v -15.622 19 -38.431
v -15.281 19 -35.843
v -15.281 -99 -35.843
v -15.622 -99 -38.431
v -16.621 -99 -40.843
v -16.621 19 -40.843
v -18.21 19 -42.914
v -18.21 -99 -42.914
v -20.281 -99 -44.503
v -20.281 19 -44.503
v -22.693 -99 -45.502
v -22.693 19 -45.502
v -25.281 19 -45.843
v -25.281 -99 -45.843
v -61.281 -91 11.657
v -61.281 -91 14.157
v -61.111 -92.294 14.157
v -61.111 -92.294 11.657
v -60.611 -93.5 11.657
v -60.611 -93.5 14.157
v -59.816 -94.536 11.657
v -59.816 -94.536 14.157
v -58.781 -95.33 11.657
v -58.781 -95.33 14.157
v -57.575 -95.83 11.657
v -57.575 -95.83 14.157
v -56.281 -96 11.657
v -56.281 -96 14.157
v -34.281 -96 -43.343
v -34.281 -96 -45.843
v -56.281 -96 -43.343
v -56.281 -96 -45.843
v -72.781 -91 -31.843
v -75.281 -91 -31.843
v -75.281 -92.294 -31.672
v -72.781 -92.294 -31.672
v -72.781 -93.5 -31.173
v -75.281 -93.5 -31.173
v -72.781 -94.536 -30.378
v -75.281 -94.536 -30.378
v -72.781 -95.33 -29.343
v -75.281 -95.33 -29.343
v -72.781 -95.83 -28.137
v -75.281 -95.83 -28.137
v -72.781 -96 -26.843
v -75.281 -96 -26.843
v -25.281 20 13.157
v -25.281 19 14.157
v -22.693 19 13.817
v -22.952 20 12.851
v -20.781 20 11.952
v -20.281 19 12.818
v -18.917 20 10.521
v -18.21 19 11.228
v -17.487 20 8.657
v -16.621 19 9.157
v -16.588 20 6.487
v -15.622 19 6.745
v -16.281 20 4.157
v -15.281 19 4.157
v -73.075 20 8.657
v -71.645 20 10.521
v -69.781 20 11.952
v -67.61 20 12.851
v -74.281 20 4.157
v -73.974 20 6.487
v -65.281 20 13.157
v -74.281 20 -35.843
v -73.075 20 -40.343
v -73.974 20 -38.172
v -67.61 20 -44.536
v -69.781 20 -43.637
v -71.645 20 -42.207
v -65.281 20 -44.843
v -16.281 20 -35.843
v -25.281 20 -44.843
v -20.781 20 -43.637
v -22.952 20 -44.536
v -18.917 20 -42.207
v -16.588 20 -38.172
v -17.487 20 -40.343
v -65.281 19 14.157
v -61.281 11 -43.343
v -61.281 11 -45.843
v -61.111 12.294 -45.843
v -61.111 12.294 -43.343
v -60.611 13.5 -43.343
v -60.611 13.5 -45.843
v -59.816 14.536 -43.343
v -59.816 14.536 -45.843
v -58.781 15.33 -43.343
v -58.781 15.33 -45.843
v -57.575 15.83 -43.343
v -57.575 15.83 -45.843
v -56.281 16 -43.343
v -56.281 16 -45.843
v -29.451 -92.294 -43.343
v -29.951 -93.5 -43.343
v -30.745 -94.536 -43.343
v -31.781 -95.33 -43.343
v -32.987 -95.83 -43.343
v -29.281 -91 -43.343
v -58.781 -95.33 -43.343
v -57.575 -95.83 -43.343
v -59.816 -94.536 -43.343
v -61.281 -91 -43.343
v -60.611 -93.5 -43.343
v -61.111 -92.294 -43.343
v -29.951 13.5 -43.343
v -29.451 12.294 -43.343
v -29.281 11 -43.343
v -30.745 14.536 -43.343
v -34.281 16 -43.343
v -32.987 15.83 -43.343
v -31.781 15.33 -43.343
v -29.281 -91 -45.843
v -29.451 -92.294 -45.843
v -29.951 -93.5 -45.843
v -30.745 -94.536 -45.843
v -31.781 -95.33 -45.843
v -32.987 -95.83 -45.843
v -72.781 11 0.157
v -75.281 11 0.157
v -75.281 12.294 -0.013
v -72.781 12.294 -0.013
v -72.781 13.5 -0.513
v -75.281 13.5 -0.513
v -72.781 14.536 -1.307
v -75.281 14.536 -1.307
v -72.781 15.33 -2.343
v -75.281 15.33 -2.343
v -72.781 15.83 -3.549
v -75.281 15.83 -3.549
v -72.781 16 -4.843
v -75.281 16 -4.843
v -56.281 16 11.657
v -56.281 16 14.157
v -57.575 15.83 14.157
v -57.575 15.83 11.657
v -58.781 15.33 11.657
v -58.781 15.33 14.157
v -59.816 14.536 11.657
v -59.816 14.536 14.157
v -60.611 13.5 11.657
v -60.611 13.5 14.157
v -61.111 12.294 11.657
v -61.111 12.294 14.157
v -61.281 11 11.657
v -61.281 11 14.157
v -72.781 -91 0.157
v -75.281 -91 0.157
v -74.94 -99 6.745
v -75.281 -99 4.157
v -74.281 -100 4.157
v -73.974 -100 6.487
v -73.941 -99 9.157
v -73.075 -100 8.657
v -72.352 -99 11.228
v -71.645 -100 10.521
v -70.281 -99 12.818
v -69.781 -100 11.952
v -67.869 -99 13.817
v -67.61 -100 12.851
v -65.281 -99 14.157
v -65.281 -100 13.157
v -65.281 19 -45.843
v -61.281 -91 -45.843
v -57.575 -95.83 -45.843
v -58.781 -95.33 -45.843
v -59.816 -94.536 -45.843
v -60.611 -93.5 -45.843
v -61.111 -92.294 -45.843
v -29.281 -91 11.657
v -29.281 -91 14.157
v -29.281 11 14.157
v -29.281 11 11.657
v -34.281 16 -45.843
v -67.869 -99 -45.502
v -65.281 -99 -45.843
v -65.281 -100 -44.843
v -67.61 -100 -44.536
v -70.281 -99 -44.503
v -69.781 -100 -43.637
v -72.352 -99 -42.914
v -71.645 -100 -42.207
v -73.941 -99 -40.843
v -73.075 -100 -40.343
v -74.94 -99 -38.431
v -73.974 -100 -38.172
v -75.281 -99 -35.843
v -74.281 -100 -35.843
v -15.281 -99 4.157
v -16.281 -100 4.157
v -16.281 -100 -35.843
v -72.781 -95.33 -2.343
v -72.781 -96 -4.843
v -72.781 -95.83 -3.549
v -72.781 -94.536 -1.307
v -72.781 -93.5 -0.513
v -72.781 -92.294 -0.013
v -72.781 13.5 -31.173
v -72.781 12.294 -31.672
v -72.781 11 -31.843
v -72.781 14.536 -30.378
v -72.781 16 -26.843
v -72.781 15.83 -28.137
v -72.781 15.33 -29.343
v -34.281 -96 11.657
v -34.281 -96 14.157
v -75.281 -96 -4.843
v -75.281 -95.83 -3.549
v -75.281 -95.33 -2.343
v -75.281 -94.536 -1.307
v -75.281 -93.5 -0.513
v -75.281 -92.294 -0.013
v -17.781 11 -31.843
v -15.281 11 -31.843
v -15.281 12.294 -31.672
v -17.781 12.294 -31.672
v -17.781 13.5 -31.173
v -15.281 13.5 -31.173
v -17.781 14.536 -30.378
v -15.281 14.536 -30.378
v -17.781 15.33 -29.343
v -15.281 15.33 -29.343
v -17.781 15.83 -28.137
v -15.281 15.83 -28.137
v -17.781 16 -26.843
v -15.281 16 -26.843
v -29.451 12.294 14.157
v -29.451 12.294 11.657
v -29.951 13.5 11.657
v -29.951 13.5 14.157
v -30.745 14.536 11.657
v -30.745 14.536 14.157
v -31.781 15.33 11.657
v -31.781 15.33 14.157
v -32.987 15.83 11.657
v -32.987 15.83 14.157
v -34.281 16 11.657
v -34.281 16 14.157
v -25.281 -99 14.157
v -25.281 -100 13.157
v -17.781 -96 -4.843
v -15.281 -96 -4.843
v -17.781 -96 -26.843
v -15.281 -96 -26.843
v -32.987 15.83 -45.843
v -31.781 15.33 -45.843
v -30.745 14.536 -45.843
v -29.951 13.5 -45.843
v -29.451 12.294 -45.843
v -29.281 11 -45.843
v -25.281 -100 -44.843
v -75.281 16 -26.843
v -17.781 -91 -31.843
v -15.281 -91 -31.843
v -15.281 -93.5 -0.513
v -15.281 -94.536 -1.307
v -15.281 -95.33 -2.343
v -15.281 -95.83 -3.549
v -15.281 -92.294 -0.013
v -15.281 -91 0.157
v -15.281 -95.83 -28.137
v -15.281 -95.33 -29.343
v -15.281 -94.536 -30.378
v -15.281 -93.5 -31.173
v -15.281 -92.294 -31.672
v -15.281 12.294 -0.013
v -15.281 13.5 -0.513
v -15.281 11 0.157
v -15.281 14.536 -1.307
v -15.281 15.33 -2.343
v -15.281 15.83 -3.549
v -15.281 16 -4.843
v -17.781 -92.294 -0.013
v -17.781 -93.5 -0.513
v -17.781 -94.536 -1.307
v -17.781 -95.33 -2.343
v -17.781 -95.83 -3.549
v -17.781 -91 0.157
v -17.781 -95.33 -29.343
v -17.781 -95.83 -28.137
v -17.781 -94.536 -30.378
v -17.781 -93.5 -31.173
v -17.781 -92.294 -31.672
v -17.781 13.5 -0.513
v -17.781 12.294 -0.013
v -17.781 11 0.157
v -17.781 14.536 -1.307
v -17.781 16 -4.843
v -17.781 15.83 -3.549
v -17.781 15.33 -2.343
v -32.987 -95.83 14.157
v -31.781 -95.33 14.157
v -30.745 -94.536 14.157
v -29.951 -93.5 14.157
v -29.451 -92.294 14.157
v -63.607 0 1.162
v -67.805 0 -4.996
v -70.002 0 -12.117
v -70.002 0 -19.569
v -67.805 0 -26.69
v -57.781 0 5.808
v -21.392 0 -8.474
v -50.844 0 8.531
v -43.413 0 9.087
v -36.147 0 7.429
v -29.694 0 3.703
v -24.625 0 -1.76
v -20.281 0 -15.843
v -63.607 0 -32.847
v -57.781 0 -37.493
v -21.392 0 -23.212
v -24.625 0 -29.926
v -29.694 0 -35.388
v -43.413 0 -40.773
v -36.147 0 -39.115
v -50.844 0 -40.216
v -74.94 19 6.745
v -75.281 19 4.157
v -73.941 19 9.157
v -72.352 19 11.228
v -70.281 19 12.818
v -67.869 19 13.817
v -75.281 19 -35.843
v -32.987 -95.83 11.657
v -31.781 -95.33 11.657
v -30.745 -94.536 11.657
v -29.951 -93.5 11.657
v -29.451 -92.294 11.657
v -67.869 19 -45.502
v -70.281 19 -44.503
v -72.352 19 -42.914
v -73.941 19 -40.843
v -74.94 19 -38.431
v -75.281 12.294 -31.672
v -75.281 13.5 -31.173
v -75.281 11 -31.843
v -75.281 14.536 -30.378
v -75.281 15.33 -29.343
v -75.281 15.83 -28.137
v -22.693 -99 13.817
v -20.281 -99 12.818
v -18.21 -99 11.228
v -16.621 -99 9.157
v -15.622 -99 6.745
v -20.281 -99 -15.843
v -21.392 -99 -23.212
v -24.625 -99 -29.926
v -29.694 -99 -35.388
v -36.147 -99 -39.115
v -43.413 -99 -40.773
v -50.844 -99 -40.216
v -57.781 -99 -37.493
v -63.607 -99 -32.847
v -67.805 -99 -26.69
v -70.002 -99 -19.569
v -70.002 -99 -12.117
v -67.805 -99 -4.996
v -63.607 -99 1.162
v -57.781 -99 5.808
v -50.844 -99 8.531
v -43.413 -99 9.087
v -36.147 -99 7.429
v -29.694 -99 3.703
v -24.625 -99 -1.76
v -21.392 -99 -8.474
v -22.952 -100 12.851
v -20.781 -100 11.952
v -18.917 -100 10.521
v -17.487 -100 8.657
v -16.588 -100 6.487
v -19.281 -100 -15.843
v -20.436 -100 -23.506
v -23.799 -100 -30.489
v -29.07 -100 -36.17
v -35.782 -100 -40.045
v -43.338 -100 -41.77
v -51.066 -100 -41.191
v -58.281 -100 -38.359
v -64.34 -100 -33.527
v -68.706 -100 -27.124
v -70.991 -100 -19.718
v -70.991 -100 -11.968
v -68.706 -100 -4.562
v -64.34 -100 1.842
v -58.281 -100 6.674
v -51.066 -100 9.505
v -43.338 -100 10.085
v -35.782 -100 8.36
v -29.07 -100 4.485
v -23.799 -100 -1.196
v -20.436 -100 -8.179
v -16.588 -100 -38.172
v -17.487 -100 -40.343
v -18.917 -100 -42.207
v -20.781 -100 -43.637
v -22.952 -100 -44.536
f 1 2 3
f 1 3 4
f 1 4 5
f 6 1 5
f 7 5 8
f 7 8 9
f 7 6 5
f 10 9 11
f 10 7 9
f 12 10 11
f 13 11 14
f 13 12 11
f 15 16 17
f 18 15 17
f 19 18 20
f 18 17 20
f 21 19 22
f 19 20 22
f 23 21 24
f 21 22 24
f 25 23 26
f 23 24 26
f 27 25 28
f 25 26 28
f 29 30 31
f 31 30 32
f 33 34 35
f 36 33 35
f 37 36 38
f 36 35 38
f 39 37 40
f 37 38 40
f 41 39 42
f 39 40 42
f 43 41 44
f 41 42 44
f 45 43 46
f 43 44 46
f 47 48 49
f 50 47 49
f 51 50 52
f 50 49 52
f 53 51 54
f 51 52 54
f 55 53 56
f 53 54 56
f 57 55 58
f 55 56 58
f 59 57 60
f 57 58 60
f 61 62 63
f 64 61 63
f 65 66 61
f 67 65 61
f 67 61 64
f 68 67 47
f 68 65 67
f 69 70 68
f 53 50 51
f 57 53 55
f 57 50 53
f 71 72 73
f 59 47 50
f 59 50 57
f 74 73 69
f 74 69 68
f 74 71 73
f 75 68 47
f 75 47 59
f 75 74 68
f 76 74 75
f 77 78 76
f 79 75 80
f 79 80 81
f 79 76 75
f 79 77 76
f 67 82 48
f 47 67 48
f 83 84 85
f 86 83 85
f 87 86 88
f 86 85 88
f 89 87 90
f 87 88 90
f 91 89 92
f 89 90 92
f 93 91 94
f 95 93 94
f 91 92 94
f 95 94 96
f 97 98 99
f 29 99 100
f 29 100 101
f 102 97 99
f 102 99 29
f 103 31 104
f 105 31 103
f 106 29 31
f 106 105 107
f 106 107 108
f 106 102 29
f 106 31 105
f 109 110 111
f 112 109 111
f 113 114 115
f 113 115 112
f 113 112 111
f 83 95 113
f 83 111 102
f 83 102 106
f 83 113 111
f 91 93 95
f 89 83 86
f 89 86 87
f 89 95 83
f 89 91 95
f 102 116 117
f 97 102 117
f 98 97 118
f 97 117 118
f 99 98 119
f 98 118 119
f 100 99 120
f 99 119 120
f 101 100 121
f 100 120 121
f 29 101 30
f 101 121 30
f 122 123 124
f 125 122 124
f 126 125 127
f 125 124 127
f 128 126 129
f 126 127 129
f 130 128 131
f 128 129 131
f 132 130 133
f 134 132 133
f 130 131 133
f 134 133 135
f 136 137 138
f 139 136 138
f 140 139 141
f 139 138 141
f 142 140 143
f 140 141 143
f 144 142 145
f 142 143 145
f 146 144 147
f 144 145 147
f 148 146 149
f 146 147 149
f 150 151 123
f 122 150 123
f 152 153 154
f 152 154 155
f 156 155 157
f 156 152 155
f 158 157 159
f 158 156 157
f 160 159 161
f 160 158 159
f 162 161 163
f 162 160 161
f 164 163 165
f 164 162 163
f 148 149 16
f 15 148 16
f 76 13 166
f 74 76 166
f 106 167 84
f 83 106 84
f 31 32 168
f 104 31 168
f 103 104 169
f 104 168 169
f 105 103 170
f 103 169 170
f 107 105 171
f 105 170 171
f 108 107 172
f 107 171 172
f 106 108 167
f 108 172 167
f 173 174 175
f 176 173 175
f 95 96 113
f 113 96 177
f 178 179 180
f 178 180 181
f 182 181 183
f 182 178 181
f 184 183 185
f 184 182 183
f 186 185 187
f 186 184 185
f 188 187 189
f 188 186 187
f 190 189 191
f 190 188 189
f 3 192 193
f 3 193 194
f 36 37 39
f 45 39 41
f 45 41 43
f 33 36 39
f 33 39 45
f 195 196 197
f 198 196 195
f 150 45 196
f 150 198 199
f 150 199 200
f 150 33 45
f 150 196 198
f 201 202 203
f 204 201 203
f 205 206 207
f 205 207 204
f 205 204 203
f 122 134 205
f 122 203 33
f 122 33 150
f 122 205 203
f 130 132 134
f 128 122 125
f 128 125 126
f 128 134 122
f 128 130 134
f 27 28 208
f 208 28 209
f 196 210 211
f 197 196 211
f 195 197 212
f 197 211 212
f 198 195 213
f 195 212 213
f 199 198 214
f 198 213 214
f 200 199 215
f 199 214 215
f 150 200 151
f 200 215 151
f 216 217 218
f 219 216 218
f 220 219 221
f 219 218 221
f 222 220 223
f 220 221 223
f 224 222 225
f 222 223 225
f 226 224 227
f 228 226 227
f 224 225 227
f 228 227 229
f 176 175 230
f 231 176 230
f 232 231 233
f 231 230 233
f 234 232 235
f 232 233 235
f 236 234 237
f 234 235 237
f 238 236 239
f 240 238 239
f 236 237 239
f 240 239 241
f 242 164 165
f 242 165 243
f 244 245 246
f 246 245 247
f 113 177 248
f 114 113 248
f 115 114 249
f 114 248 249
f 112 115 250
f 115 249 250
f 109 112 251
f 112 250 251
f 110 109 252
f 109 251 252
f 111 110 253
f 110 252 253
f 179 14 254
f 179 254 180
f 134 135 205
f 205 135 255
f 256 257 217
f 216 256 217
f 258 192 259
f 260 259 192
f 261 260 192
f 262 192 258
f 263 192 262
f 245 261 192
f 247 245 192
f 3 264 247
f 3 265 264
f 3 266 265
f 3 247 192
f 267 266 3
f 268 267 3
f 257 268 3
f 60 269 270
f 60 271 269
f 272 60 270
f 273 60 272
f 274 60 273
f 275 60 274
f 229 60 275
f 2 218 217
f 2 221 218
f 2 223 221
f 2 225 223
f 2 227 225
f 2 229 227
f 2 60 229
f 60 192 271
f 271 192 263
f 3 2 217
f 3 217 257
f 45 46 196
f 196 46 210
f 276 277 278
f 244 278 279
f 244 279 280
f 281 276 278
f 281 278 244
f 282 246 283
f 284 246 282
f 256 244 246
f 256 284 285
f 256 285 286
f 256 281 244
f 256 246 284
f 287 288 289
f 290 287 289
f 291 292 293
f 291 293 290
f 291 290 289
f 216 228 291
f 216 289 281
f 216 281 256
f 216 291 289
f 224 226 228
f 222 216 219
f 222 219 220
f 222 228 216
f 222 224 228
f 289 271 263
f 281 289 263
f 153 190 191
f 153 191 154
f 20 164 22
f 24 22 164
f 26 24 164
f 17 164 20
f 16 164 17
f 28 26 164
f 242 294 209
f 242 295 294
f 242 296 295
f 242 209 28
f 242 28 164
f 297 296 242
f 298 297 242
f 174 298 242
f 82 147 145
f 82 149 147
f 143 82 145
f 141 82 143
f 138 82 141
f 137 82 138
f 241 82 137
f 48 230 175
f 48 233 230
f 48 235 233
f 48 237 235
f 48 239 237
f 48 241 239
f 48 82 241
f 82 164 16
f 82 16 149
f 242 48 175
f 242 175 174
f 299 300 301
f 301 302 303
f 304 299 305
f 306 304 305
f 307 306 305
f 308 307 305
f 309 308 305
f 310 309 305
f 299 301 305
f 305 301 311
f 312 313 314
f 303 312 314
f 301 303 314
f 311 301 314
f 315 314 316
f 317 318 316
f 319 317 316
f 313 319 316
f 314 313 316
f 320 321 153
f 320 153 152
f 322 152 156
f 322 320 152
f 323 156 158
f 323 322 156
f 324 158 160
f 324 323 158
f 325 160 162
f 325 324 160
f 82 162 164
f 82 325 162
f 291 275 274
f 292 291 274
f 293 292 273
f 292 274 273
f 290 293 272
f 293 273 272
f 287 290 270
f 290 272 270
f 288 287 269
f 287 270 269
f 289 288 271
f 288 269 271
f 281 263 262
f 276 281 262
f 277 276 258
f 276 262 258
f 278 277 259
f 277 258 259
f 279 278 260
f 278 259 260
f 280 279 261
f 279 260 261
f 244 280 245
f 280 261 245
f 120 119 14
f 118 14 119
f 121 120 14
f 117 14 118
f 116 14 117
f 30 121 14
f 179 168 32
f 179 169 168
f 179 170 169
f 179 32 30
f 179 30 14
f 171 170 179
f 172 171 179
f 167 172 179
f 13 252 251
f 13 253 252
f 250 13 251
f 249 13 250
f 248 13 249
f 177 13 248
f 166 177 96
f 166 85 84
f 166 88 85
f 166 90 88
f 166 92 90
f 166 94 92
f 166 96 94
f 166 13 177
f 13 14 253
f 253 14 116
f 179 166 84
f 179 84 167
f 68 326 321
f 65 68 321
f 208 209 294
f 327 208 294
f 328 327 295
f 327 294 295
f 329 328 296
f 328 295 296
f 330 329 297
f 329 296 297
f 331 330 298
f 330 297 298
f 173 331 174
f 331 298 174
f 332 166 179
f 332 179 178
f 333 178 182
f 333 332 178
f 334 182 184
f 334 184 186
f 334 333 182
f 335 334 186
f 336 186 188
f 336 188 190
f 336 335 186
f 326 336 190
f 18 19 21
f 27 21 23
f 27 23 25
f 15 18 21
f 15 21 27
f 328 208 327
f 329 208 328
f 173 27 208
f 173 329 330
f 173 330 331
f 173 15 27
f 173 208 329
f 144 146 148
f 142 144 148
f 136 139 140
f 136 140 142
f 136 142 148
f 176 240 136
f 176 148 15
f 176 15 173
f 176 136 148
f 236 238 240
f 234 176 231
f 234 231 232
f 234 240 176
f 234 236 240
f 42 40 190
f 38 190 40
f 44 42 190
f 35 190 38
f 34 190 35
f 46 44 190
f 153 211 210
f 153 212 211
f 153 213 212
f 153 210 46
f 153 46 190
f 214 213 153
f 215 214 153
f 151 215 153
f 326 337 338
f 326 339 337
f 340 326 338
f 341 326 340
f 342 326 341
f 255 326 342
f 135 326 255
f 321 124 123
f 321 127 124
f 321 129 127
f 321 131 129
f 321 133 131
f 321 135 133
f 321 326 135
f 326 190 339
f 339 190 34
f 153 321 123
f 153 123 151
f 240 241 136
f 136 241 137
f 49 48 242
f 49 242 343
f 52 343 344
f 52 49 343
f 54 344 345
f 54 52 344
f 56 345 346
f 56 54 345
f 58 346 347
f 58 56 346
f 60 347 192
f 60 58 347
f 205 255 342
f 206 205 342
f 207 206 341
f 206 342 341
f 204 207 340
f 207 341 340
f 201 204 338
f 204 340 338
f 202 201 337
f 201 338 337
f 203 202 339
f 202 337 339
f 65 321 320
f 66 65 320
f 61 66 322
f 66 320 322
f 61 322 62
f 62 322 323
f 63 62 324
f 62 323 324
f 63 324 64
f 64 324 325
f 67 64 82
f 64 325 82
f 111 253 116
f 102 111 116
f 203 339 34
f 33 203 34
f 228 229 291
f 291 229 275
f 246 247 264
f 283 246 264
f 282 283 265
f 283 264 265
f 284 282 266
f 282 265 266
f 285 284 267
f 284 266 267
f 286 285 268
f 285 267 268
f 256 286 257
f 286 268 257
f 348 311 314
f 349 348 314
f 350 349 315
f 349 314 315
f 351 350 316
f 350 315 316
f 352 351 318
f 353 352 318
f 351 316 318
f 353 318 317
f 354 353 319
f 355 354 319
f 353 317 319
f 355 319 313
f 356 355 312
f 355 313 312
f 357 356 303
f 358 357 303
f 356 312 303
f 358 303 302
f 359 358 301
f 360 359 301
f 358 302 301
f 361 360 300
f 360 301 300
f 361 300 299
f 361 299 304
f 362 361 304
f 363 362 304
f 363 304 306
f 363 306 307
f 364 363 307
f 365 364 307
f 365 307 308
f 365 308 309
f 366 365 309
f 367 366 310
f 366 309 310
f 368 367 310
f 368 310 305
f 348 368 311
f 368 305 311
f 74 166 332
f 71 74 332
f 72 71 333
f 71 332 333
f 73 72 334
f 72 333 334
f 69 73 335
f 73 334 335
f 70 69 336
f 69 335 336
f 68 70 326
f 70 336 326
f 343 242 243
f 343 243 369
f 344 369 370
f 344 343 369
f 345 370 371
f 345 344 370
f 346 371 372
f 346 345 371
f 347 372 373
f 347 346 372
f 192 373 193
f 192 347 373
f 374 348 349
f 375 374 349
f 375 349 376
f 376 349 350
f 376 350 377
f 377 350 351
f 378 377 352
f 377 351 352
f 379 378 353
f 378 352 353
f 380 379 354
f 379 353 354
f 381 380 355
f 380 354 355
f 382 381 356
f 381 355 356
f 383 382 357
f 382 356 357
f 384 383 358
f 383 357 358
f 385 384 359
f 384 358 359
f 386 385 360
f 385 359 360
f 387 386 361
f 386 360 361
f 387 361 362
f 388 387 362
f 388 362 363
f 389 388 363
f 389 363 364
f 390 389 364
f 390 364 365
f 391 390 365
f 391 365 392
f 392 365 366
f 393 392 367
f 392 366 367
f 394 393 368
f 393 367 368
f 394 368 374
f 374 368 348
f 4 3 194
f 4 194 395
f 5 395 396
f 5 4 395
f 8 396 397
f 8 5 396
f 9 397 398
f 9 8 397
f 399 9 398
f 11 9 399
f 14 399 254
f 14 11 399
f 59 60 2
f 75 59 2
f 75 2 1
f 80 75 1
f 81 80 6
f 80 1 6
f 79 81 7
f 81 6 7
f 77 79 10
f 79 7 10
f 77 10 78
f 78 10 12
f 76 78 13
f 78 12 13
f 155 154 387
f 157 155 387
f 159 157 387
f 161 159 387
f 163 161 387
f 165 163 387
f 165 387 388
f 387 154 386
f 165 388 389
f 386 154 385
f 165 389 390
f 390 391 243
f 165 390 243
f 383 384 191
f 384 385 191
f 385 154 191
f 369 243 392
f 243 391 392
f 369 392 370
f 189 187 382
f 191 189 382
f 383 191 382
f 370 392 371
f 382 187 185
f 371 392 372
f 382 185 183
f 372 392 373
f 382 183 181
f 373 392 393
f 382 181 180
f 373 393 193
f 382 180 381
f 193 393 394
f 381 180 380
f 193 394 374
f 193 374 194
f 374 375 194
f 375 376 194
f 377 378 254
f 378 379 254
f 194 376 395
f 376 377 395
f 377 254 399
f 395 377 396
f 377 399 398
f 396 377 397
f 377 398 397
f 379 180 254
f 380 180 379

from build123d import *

# Parameters (mm, degrees)
BOSS_EXTRUDE1_DEPTH = 20
BOSS_EXTRUDE2_START = -100
SKETCH1_3_R         = 25
BOSS_EXTRUDE2_DEPTH = 100
CUT_EXTRUDE1_DEPTH  = 2.5
CIRPATTERN1_COUNT   = 4
CHAMFER1_SIZE       = 1


with BuildPart() as part:
    # Sketch1 → Boss-Extrude1 (new body)
    with BuildSketch(Plane(origin=(0, 0, 0), x_dir=(1, 0, 0), z_dir=(0, 1, 0))):
        with BuildLine():
            Line((-65.280898876, -14.157303371), (-25.280898876, -14.157303371))
            ThreePointArc((-25.280898876, -14.157303371), (-18.209831065, -11.228371183), (-15.280898876, -4.157303371))
            Line((-15.280898876, -4.157303371), (-15.280898876, 35.842696629))
            ThreePointArc((-15.280898876, 35.842696629), (-18.209831065, 42.913764441), (-25.280898876, 45.842696629))
            Line((-25.280898876, 45.842696629), (-65.280898876, 45.842696629))
            ThreePointArc((-65.280898876, 45.842696629), (-72.351966688, 42.913764441), (-75.280898876, 35.842696629))
            Line((-75.280898876, 35.842696629), (-75.280898876, -4.157303371))
            ThreePointArc((-75.280898876, -4.157303371), (-72.351966688, -11.228371183), (-65.280898876, -14.157303371))
        make_face()
    extrude(amount=BOSS_EXTRUDE1_DEPTH)

    # Sketch1<3> → Boss-Extrude2 (add)
    with BuildSketch(Plane(origin=(0, 0, 0), x_dir=(1, 0, 0), z_dir=(0, 1, 0)).offset(BOSS_EXTRUDE2_START)):
        with BuildLine():
            Line((-65.280898876, -14.157303371), (-25.280898876, -14.157303371))
            ThreePointArc((-25.280898876, -14.157303371), (-18.209831065, -11.228371183), (-15.280898876, -4.157303371))
            Line((-15.280898876, -4.157303371), (-15.280898876, 35.842696629))
            ThreePointArc((-15.280898876, 35.842696629), (-18.209831065, 42.913764441), (-25.280898876, 45.842696629))
            Line((-25.280898876, 45.842696629), (-65.280898876, 45.842696629))
            ThreePointArc((-65.280898876, 45.842696629), (-72.351966688, 42.913764441), (-75.280898876, 35.842696629))
            Line((-75.280898876, 35.842696629), (-75.280898876, -4.157303371))
            ThreePointArc((-75.280898876, -4.157303371), (-72.351966688, -11.228371183), (-65.280898876, -14.157303371))
        make_face()
        with Locations((-45.280898876, 15.842696629)):
            Circle(SKETCH1_3_R, mode=Mode.SUBTRACT)
    extrude(amount=BOSS_EXTRUDE2_DEPTH)

    # Sketch2 → Cut-Extrude1 (cut)
    with BuildSketch(Plane(origin=(0, 0, -45.842696629), x_dir=(-1, 0, 0), z_dir=(0, 0, -1))):
        with BuildLine():
            Line((61.280898876, -91), (61.280898876, 11))
            ThreePointArc((61.280898876, 11), (59.816432782, 14.535533906), (56.280898876, 16))
            Line((56.280898876, 16), (34.280898876, 16))
            ThreePointArc((34.280898876, 16), (30.74536497, 14.535533906), (29.280898876, 11))
            Line((29.280898876, 11), (29.280898876, -91))
            ThreePointArc((29.280898876, -91), (30.74536497, -94.535533906), (34.280898876, -96))
            Line((34.280898876, -96), (56.280898876, -96))
            ThreePointArc((56.280898876, -96), (59.816432782, -94.535533906), (61.280898876, -91))
        make_face()
    cut_extrude1 = extrude(amount=-CUT_EXTRUDE1_DEPTH, mode=Mode.SUBTRACT)

    # CirPattern1: Cut-Extrude1 ×4 about axis
    cirpattern1_axis = Axis((-45.280898876, -100, -15.842696629), (0, 1, 0))
    for i in range(1, CIRPATTERN1_COUNT):
        add(cut_extrude1.rotate(cirpattern1_axis, i * 360 / CIRPATTERN1_COUNT), mode=Mode.SUBTRACT)

    # Chamfer1
    chamfer1_edges = [part.edges().sort_by_distance(p)[0] for p in [
        (-70.280898876, -100, -15.842696629),
        (-75.280898876, -100, -15.842696629),
        (-72.351966688, -100, -42.913764441),
        (-45.280898876, -100, -45.842696629),
        (-18.209831065, -100, -42.913764441),
        (-15.280898876, -100, -15.842696629),
        (-18.209831065, -100, 11.228371183),
        (-45.280898876, -100, 14.157303371),
        (-72.351966688, -100, 11.228371183),
        (-18.209831065, 20, 11.228371183),
        (-18.209831065, 20, -42.913764441),
        (-72.351966688, 20, -42.913764441),
        (-72.351966688, 20, 11.228371183),
        (-45.280898876, 20, -45.842696629),
        (-15.280898876, 20, -15.842696629),
        (-45.280898876, 20, 14.157303371),
        (-75.280898876, 20, -15.842696629),
    ]]
    chamfer(chamfer1_edges, length=CHAMFER1_SIZE)


solid = part.part
